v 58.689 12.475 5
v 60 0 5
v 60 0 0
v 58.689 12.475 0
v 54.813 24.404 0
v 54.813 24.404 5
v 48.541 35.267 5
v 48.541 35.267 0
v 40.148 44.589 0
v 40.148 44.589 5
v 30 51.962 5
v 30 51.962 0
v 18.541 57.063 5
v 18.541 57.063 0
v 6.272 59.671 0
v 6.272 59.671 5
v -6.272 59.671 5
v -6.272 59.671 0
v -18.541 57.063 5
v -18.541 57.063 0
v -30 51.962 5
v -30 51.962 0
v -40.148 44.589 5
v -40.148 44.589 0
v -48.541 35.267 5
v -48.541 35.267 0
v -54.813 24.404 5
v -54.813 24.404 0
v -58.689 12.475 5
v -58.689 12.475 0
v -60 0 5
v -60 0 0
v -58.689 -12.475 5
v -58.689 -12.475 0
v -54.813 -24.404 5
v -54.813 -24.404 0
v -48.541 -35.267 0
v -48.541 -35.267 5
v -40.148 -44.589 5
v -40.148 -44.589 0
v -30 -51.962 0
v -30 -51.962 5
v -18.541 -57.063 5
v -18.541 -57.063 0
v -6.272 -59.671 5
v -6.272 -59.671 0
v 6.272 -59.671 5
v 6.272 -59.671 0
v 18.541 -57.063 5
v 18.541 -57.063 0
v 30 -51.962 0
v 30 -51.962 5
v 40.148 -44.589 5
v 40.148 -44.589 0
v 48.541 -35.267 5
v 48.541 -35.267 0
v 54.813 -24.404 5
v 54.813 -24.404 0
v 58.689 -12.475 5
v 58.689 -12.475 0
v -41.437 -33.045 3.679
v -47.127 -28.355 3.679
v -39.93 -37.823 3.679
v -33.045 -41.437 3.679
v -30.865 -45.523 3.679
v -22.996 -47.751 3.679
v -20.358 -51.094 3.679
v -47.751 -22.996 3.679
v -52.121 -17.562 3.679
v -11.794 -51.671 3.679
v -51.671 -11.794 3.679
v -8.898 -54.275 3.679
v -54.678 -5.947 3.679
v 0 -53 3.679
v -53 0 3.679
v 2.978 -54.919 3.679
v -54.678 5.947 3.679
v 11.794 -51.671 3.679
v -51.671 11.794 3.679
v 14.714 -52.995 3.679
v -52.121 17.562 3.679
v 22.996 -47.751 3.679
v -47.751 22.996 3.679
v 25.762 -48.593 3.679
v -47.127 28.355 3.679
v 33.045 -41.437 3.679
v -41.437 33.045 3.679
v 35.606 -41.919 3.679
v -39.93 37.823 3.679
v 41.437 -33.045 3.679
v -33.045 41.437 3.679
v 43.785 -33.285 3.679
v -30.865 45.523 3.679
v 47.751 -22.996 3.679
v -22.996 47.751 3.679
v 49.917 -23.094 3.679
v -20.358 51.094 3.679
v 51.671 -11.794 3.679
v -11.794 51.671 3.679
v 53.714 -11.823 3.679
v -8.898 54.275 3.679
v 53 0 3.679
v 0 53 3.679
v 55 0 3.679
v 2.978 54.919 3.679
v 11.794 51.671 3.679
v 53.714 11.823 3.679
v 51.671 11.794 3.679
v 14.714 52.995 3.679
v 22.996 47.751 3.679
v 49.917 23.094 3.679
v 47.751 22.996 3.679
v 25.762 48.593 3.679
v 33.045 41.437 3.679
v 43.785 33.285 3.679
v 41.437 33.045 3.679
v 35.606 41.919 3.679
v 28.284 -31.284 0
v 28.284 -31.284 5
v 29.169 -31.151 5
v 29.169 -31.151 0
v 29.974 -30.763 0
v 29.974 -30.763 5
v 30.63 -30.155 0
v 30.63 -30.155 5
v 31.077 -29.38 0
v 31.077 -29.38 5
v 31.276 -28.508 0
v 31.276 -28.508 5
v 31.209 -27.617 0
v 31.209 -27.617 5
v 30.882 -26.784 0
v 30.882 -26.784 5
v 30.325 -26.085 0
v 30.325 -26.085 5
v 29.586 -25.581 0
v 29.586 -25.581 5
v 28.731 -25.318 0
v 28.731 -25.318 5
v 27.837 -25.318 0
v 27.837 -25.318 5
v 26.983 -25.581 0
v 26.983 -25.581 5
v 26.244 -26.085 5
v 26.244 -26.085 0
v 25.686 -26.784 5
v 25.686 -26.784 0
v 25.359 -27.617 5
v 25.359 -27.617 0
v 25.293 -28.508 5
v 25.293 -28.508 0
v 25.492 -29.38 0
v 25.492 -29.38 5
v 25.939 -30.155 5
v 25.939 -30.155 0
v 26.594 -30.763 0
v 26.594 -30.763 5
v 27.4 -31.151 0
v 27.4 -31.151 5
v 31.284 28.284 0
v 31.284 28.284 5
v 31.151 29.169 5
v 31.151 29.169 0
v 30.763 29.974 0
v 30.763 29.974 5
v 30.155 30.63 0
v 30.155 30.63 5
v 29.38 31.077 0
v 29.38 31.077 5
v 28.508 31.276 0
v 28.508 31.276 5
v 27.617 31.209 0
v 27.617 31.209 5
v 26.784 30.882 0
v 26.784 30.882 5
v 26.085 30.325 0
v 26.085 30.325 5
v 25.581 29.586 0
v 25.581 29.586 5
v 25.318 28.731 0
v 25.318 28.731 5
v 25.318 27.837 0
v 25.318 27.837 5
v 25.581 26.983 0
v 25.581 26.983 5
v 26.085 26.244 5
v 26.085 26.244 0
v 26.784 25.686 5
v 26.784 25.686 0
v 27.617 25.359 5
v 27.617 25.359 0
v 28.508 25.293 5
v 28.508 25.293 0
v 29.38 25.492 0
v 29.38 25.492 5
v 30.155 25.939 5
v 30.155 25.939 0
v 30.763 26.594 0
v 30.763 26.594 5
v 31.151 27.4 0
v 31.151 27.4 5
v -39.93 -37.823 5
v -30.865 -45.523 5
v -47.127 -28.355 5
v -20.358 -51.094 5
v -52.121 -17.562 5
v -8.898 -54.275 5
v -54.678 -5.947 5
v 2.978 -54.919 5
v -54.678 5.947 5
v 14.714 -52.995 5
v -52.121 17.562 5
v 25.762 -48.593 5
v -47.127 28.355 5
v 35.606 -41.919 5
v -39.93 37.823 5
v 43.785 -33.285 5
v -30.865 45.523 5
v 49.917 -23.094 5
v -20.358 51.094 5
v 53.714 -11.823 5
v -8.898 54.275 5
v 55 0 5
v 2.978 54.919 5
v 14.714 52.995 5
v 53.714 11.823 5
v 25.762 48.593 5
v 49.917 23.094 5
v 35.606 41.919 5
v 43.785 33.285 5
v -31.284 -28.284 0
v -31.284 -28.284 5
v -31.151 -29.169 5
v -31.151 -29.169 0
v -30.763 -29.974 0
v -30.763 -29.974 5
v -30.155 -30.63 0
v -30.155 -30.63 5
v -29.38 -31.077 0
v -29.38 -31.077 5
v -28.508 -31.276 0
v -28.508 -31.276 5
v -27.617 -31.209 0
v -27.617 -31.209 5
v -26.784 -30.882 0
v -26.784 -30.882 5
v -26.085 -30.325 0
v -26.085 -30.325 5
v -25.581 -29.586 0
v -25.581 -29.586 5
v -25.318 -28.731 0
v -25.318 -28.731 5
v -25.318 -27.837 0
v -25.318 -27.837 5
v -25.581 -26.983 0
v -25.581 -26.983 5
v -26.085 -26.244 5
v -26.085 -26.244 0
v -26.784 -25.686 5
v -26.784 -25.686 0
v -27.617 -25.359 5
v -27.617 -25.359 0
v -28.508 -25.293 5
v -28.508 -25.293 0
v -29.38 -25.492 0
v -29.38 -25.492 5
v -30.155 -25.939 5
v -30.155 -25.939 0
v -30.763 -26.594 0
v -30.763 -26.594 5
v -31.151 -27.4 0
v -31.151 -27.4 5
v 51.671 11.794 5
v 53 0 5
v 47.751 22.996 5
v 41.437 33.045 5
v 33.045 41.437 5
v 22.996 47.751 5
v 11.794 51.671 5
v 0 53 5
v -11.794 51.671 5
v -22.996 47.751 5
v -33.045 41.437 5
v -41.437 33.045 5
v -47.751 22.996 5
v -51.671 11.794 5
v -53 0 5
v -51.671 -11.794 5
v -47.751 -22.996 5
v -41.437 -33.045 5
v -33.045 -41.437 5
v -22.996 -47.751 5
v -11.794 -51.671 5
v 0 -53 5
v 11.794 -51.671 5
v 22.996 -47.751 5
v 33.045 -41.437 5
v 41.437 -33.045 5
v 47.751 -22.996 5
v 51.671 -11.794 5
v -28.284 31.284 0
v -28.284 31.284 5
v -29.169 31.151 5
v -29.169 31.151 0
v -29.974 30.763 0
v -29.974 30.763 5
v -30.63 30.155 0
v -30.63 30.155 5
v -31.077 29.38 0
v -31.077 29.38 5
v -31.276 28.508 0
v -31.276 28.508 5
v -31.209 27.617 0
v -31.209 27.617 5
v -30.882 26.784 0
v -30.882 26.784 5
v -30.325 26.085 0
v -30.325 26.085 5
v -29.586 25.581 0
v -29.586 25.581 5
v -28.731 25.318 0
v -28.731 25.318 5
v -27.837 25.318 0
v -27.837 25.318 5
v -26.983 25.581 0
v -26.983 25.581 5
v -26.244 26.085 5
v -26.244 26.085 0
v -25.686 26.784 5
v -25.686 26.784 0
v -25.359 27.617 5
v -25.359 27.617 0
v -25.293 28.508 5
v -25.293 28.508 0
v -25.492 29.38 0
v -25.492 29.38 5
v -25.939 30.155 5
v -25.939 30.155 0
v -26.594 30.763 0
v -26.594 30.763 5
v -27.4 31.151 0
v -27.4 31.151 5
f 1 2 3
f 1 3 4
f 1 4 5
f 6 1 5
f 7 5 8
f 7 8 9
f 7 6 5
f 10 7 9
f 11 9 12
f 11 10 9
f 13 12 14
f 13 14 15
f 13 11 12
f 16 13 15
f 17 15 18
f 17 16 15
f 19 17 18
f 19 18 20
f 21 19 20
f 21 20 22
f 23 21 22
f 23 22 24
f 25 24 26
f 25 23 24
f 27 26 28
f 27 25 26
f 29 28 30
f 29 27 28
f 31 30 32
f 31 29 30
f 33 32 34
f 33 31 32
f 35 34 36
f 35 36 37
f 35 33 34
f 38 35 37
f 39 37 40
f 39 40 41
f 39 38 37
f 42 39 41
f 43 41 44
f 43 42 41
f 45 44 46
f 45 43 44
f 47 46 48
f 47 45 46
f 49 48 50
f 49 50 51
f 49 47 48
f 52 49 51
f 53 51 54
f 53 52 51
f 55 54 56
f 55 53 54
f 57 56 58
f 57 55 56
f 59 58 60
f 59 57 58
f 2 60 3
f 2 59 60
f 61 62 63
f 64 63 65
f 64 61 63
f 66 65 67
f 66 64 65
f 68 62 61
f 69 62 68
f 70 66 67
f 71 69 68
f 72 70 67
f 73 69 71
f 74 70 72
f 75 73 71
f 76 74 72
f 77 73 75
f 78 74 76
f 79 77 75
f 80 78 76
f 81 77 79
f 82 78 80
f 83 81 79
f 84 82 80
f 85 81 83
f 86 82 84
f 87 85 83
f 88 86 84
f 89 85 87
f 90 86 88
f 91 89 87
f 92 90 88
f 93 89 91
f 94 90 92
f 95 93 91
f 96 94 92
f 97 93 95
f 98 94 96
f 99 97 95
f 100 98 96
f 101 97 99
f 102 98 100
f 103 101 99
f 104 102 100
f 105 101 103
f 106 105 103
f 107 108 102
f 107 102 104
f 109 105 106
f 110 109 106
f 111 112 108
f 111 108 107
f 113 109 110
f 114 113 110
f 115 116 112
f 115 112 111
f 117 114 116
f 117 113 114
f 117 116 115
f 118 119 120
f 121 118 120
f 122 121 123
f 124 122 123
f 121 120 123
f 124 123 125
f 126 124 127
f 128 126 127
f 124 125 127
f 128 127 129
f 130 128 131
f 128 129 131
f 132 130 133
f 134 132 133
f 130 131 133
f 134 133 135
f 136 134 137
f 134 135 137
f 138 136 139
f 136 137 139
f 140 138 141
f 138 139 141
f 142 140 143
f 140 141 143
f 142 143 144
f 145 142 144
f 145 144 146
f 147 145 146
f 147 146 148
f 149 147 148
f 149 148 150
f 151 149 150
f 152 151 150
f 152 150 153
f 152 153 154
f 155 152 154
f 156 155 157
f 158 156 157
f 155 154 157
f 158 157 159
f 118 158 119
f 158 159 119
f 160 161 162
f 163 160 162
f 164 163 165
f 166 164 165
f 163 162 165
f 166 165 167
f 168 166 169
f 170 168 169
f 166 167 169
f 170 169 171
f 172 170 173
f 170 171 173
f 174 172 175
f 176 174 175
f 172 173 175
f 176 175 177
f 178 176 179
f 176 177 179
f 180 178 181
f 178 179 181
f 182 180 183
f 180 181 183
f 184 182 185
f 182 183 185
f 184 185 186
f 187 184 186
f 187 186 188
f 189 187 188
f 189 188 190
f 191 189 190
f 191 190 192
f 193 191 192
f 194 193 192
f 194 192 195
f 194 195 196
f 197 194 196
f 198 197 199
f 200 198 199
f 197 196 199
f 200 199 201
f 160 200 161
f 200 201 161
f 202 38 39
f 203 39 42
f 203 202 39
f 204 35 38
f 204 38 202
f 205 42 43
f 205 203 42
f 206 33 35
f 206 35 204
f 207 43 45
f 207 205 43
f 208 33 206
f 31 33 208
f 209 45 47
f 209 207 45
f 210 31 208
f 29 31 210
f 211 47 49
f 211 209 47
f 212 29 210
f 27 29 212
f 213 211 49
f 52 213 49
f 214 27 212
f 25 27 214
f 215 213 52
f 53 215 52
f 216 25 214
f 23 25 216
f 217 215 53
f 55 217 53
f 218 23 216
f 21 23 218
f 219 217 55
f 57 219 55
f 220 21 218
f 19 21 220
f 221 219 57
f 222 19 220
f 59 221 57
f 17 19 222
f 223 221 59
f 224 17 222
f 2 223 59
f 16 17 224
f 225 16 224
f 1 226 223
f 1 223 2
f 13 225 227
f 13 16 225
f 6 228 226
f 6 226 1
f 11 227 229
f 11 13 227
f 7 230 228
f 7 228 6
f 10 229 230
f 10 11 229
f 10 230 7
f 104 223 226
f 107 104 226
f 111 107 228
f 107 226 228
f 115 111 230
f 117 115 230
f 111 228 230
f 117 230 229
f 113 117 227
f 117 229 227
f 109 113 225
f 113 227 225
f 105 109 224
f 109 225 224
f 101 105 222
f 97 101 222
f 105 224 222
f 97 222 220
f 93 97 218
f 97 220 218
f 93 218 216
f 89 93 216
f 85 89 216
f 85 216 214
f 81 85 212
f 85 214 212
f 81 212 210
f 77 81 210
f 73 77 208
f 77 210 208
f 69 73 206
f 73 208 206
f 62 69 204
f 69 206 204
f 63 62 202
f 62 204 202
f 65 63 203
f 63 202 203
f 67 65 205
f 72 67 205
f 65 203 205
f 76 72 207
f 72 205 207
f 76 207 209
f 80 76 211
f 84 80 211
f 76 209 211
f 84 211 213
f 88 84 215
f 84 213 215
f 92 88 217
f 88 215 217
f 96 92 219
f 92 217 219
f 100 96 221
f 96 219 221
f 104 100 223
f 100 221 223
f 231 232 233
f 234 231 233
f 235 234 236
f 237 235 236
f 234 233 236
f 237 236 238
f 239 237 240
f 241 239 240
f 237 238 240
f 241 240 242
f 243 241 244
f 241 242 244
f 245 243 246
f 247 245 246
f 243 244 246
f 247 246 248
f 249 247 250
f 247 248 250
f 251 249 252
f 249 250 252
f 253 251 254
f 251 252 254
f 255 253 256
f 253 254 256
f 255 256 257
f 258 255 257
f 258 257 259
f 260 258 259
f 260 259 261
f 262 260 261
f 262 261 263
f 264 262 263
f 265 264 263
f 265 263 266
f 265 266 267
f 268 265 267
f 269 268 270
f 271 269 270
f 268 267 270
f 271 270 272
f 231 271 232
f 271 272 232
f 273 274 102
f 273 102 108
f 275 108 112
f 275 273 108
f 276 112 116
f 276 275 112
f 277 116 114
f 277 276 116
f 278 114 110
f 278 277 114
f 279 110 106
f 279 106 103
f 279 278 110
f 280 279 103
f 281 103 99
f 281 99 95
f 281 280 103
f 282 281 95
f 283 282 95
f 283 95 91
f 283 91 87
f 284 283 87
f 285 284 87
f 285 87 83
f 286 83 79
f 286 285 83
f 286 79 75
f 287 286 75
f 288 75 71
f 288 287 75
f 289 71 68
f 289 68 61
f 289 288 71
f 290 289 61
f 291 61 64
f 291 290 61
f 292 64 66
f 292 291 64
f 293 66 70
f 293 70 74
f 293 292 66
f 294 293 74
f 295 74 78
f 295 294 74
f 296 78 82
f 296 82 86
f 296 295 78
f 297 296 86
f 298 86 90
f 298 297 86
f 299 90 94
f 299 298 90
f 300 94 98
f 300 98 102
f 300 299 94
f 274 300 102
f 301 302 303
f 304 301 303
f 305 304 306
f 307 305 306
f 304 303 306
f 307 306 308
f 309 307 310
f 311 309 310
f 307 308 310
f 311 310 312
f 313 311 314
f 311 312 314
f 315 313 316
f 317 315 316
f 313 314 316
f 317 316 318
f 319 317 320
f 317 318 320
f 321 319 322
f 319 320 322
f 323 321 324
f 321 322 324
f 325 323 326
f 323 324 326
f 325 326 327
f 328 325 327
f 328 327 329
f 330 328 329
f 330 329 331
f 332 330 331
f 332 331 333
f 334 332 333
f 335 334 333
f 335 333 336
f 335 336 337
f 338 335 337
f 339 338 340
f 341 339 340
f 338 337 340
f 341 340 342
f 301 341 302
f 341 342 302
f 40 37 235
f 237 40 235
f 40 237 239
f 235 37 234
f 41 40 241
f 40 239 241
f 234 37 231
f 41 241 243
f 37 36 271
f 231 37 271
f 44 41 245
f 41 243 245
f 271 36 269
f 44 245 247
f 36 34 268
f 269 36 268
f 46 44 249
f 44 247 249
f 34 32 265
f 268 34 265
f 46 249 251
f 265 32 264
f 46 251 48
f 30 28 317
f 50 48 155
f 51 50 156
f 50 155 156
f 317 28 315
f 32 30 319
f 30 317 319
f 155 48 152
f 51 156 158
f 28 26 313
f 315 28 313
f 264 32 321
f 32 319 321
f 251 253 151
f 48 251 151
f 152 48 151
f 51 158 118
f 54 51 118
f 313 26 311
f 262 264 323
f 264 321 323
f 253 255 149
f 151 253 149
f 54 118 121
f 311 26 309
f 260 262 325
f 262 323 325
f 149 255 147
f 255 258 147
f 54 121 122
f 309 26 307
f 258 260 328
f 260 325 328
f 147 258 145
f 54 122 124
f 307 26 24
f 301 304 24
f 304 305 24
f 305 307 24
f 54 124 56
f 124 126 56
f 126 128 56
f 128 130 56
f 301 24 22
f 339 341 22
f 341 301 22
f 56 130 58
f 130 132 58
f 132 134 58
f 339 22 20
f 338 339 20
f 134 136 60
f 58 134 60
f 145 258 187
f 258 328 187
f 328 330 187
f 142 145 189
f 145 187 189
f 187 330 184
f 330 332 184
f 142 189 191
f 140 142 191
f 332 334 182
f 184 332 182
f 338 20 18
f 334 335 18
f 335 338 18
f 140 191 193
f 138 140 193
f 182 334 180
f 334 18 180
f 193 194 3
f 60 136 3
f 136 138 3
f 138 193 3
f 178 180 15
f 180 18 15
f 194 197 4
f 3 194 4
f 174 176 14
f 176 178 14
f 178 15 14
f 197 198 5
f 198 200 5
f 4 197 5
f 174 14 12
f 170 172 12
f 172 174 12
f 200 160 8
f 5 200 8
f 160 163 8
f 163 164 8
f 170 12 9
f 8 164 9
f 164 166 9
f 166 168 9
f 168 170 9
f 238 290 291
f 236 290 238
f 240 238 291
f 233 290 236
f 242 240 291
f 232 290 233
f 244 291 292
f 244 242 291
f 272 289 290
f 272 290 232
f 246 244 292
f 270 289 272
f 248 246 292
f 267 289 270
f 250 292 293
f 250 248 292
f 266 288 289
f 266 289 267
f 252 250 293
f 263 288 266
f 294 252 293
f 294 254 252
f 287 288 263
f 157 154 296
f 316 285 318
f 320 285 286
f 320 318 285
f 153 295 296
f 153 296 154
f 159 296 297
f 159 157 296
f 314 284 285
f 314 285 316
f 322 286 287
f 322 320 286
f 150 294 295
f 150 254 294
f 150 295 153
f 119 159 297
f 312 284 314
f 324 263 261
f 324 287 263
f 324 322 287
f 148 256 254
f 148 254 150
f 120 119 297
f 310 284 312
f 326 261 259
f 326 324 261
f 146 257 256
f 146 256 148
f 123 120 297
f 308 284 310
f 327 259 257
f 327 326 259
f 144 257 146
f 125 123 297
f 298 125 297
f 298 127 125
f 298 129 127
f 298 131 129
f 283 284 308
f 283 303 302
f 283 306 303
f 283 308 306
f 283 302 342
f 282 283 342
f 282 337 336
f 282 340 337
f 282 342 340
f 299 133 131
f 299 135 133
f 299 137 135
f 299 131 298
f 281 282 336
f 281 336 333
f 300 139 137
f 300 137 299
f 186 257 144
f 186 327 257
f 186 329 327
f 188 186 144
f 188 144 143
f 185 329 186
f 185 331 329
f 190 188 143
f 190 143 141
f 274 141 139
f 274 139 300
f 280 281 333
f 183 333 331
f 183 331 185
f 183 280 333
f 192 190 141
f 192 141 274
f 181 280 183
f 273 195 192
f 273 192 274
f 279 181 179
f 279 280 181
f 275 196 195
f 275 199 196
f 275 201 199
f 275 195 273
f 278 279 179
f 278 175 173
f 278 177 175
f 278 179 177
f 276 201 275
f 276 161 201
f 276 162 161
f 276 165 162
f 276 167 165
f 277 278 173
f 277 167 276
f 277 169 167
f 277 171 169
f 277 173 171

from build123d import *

# Parameters (mm, degrees)
SKETCH1_R           = 75
BOSS_EXTRUDE1_DEPTH = 5
SKETCH2_R           = 3
CUT_EXTRUDE1_DEPTH  = 5
CIRPATTERN1_COUNT   = 4
SKETCH4_R           = 55
SKETCH4_R_2         = 53
CUT_EXTRUDE3_DEPTH  = 1.3208
SKETCH5_R           = 75
SKETCH5_R_2         = 60
CUT_EXTRUDE4_DEPTH  = 5


with BuildPart() as part:
    # Sketch1 → Boss-Extrude1 (new body)
    with BuildSketch(Plane.XY):
        Circle(SKETCH1_R)
    extrude(amount=BOSS_EXTRUDE1_DEPTH)

    # Sketch2 → Cut-Extrude1 (cut)
    with BuildSketch(Plane.XY.offset(5)):
        with Locations((28.284271247, 28.284271247)):
            Circle(SKETCH2_R)
    cut_extrude1 = extrude(amount=-CUT_EXTRUDE1_DEPTH, mode=Mode.SUBTRACT)

    # CirPattern1: Cut-Extrude1 ×4 about axis
    cirpattern1_axis = Axis((0, 0, 0), (0, 0, 1))
    for i in range(1, CIRPATTERN1_COUNT):
        add(cut_extrude1.rotate(cirpattern1_axis, i * 360 / CIRPATTERN1_COUNT), mode=Mode.SUBTRACT)

    # Sketch4 → Cut-Extrude3 (cut)
    with BuildSketch(Plane.XY.offset(5)):
        Circle(SKETCH4_R)
        Circle(SKETCH4_R_2, mode=Mode.SUBTRACT)
    extrude(amount=-CUT_EXTRUDE3_DEPTH, mode=Mode.SUBTRACT)

    # Sketch5 → Cut-Extrude4 (cut)
    with BuildSketch(Plane.XY.offset(5)):
        Circle(SKETCH5_R)
        Circle(SKETCH5_R_2, mode=Mode.SUBTRACT)
    extrude(amount=-CUT_EXTRUDE4_DEPTH, mode=Mode.SUBTRACT)


solid = part.part
